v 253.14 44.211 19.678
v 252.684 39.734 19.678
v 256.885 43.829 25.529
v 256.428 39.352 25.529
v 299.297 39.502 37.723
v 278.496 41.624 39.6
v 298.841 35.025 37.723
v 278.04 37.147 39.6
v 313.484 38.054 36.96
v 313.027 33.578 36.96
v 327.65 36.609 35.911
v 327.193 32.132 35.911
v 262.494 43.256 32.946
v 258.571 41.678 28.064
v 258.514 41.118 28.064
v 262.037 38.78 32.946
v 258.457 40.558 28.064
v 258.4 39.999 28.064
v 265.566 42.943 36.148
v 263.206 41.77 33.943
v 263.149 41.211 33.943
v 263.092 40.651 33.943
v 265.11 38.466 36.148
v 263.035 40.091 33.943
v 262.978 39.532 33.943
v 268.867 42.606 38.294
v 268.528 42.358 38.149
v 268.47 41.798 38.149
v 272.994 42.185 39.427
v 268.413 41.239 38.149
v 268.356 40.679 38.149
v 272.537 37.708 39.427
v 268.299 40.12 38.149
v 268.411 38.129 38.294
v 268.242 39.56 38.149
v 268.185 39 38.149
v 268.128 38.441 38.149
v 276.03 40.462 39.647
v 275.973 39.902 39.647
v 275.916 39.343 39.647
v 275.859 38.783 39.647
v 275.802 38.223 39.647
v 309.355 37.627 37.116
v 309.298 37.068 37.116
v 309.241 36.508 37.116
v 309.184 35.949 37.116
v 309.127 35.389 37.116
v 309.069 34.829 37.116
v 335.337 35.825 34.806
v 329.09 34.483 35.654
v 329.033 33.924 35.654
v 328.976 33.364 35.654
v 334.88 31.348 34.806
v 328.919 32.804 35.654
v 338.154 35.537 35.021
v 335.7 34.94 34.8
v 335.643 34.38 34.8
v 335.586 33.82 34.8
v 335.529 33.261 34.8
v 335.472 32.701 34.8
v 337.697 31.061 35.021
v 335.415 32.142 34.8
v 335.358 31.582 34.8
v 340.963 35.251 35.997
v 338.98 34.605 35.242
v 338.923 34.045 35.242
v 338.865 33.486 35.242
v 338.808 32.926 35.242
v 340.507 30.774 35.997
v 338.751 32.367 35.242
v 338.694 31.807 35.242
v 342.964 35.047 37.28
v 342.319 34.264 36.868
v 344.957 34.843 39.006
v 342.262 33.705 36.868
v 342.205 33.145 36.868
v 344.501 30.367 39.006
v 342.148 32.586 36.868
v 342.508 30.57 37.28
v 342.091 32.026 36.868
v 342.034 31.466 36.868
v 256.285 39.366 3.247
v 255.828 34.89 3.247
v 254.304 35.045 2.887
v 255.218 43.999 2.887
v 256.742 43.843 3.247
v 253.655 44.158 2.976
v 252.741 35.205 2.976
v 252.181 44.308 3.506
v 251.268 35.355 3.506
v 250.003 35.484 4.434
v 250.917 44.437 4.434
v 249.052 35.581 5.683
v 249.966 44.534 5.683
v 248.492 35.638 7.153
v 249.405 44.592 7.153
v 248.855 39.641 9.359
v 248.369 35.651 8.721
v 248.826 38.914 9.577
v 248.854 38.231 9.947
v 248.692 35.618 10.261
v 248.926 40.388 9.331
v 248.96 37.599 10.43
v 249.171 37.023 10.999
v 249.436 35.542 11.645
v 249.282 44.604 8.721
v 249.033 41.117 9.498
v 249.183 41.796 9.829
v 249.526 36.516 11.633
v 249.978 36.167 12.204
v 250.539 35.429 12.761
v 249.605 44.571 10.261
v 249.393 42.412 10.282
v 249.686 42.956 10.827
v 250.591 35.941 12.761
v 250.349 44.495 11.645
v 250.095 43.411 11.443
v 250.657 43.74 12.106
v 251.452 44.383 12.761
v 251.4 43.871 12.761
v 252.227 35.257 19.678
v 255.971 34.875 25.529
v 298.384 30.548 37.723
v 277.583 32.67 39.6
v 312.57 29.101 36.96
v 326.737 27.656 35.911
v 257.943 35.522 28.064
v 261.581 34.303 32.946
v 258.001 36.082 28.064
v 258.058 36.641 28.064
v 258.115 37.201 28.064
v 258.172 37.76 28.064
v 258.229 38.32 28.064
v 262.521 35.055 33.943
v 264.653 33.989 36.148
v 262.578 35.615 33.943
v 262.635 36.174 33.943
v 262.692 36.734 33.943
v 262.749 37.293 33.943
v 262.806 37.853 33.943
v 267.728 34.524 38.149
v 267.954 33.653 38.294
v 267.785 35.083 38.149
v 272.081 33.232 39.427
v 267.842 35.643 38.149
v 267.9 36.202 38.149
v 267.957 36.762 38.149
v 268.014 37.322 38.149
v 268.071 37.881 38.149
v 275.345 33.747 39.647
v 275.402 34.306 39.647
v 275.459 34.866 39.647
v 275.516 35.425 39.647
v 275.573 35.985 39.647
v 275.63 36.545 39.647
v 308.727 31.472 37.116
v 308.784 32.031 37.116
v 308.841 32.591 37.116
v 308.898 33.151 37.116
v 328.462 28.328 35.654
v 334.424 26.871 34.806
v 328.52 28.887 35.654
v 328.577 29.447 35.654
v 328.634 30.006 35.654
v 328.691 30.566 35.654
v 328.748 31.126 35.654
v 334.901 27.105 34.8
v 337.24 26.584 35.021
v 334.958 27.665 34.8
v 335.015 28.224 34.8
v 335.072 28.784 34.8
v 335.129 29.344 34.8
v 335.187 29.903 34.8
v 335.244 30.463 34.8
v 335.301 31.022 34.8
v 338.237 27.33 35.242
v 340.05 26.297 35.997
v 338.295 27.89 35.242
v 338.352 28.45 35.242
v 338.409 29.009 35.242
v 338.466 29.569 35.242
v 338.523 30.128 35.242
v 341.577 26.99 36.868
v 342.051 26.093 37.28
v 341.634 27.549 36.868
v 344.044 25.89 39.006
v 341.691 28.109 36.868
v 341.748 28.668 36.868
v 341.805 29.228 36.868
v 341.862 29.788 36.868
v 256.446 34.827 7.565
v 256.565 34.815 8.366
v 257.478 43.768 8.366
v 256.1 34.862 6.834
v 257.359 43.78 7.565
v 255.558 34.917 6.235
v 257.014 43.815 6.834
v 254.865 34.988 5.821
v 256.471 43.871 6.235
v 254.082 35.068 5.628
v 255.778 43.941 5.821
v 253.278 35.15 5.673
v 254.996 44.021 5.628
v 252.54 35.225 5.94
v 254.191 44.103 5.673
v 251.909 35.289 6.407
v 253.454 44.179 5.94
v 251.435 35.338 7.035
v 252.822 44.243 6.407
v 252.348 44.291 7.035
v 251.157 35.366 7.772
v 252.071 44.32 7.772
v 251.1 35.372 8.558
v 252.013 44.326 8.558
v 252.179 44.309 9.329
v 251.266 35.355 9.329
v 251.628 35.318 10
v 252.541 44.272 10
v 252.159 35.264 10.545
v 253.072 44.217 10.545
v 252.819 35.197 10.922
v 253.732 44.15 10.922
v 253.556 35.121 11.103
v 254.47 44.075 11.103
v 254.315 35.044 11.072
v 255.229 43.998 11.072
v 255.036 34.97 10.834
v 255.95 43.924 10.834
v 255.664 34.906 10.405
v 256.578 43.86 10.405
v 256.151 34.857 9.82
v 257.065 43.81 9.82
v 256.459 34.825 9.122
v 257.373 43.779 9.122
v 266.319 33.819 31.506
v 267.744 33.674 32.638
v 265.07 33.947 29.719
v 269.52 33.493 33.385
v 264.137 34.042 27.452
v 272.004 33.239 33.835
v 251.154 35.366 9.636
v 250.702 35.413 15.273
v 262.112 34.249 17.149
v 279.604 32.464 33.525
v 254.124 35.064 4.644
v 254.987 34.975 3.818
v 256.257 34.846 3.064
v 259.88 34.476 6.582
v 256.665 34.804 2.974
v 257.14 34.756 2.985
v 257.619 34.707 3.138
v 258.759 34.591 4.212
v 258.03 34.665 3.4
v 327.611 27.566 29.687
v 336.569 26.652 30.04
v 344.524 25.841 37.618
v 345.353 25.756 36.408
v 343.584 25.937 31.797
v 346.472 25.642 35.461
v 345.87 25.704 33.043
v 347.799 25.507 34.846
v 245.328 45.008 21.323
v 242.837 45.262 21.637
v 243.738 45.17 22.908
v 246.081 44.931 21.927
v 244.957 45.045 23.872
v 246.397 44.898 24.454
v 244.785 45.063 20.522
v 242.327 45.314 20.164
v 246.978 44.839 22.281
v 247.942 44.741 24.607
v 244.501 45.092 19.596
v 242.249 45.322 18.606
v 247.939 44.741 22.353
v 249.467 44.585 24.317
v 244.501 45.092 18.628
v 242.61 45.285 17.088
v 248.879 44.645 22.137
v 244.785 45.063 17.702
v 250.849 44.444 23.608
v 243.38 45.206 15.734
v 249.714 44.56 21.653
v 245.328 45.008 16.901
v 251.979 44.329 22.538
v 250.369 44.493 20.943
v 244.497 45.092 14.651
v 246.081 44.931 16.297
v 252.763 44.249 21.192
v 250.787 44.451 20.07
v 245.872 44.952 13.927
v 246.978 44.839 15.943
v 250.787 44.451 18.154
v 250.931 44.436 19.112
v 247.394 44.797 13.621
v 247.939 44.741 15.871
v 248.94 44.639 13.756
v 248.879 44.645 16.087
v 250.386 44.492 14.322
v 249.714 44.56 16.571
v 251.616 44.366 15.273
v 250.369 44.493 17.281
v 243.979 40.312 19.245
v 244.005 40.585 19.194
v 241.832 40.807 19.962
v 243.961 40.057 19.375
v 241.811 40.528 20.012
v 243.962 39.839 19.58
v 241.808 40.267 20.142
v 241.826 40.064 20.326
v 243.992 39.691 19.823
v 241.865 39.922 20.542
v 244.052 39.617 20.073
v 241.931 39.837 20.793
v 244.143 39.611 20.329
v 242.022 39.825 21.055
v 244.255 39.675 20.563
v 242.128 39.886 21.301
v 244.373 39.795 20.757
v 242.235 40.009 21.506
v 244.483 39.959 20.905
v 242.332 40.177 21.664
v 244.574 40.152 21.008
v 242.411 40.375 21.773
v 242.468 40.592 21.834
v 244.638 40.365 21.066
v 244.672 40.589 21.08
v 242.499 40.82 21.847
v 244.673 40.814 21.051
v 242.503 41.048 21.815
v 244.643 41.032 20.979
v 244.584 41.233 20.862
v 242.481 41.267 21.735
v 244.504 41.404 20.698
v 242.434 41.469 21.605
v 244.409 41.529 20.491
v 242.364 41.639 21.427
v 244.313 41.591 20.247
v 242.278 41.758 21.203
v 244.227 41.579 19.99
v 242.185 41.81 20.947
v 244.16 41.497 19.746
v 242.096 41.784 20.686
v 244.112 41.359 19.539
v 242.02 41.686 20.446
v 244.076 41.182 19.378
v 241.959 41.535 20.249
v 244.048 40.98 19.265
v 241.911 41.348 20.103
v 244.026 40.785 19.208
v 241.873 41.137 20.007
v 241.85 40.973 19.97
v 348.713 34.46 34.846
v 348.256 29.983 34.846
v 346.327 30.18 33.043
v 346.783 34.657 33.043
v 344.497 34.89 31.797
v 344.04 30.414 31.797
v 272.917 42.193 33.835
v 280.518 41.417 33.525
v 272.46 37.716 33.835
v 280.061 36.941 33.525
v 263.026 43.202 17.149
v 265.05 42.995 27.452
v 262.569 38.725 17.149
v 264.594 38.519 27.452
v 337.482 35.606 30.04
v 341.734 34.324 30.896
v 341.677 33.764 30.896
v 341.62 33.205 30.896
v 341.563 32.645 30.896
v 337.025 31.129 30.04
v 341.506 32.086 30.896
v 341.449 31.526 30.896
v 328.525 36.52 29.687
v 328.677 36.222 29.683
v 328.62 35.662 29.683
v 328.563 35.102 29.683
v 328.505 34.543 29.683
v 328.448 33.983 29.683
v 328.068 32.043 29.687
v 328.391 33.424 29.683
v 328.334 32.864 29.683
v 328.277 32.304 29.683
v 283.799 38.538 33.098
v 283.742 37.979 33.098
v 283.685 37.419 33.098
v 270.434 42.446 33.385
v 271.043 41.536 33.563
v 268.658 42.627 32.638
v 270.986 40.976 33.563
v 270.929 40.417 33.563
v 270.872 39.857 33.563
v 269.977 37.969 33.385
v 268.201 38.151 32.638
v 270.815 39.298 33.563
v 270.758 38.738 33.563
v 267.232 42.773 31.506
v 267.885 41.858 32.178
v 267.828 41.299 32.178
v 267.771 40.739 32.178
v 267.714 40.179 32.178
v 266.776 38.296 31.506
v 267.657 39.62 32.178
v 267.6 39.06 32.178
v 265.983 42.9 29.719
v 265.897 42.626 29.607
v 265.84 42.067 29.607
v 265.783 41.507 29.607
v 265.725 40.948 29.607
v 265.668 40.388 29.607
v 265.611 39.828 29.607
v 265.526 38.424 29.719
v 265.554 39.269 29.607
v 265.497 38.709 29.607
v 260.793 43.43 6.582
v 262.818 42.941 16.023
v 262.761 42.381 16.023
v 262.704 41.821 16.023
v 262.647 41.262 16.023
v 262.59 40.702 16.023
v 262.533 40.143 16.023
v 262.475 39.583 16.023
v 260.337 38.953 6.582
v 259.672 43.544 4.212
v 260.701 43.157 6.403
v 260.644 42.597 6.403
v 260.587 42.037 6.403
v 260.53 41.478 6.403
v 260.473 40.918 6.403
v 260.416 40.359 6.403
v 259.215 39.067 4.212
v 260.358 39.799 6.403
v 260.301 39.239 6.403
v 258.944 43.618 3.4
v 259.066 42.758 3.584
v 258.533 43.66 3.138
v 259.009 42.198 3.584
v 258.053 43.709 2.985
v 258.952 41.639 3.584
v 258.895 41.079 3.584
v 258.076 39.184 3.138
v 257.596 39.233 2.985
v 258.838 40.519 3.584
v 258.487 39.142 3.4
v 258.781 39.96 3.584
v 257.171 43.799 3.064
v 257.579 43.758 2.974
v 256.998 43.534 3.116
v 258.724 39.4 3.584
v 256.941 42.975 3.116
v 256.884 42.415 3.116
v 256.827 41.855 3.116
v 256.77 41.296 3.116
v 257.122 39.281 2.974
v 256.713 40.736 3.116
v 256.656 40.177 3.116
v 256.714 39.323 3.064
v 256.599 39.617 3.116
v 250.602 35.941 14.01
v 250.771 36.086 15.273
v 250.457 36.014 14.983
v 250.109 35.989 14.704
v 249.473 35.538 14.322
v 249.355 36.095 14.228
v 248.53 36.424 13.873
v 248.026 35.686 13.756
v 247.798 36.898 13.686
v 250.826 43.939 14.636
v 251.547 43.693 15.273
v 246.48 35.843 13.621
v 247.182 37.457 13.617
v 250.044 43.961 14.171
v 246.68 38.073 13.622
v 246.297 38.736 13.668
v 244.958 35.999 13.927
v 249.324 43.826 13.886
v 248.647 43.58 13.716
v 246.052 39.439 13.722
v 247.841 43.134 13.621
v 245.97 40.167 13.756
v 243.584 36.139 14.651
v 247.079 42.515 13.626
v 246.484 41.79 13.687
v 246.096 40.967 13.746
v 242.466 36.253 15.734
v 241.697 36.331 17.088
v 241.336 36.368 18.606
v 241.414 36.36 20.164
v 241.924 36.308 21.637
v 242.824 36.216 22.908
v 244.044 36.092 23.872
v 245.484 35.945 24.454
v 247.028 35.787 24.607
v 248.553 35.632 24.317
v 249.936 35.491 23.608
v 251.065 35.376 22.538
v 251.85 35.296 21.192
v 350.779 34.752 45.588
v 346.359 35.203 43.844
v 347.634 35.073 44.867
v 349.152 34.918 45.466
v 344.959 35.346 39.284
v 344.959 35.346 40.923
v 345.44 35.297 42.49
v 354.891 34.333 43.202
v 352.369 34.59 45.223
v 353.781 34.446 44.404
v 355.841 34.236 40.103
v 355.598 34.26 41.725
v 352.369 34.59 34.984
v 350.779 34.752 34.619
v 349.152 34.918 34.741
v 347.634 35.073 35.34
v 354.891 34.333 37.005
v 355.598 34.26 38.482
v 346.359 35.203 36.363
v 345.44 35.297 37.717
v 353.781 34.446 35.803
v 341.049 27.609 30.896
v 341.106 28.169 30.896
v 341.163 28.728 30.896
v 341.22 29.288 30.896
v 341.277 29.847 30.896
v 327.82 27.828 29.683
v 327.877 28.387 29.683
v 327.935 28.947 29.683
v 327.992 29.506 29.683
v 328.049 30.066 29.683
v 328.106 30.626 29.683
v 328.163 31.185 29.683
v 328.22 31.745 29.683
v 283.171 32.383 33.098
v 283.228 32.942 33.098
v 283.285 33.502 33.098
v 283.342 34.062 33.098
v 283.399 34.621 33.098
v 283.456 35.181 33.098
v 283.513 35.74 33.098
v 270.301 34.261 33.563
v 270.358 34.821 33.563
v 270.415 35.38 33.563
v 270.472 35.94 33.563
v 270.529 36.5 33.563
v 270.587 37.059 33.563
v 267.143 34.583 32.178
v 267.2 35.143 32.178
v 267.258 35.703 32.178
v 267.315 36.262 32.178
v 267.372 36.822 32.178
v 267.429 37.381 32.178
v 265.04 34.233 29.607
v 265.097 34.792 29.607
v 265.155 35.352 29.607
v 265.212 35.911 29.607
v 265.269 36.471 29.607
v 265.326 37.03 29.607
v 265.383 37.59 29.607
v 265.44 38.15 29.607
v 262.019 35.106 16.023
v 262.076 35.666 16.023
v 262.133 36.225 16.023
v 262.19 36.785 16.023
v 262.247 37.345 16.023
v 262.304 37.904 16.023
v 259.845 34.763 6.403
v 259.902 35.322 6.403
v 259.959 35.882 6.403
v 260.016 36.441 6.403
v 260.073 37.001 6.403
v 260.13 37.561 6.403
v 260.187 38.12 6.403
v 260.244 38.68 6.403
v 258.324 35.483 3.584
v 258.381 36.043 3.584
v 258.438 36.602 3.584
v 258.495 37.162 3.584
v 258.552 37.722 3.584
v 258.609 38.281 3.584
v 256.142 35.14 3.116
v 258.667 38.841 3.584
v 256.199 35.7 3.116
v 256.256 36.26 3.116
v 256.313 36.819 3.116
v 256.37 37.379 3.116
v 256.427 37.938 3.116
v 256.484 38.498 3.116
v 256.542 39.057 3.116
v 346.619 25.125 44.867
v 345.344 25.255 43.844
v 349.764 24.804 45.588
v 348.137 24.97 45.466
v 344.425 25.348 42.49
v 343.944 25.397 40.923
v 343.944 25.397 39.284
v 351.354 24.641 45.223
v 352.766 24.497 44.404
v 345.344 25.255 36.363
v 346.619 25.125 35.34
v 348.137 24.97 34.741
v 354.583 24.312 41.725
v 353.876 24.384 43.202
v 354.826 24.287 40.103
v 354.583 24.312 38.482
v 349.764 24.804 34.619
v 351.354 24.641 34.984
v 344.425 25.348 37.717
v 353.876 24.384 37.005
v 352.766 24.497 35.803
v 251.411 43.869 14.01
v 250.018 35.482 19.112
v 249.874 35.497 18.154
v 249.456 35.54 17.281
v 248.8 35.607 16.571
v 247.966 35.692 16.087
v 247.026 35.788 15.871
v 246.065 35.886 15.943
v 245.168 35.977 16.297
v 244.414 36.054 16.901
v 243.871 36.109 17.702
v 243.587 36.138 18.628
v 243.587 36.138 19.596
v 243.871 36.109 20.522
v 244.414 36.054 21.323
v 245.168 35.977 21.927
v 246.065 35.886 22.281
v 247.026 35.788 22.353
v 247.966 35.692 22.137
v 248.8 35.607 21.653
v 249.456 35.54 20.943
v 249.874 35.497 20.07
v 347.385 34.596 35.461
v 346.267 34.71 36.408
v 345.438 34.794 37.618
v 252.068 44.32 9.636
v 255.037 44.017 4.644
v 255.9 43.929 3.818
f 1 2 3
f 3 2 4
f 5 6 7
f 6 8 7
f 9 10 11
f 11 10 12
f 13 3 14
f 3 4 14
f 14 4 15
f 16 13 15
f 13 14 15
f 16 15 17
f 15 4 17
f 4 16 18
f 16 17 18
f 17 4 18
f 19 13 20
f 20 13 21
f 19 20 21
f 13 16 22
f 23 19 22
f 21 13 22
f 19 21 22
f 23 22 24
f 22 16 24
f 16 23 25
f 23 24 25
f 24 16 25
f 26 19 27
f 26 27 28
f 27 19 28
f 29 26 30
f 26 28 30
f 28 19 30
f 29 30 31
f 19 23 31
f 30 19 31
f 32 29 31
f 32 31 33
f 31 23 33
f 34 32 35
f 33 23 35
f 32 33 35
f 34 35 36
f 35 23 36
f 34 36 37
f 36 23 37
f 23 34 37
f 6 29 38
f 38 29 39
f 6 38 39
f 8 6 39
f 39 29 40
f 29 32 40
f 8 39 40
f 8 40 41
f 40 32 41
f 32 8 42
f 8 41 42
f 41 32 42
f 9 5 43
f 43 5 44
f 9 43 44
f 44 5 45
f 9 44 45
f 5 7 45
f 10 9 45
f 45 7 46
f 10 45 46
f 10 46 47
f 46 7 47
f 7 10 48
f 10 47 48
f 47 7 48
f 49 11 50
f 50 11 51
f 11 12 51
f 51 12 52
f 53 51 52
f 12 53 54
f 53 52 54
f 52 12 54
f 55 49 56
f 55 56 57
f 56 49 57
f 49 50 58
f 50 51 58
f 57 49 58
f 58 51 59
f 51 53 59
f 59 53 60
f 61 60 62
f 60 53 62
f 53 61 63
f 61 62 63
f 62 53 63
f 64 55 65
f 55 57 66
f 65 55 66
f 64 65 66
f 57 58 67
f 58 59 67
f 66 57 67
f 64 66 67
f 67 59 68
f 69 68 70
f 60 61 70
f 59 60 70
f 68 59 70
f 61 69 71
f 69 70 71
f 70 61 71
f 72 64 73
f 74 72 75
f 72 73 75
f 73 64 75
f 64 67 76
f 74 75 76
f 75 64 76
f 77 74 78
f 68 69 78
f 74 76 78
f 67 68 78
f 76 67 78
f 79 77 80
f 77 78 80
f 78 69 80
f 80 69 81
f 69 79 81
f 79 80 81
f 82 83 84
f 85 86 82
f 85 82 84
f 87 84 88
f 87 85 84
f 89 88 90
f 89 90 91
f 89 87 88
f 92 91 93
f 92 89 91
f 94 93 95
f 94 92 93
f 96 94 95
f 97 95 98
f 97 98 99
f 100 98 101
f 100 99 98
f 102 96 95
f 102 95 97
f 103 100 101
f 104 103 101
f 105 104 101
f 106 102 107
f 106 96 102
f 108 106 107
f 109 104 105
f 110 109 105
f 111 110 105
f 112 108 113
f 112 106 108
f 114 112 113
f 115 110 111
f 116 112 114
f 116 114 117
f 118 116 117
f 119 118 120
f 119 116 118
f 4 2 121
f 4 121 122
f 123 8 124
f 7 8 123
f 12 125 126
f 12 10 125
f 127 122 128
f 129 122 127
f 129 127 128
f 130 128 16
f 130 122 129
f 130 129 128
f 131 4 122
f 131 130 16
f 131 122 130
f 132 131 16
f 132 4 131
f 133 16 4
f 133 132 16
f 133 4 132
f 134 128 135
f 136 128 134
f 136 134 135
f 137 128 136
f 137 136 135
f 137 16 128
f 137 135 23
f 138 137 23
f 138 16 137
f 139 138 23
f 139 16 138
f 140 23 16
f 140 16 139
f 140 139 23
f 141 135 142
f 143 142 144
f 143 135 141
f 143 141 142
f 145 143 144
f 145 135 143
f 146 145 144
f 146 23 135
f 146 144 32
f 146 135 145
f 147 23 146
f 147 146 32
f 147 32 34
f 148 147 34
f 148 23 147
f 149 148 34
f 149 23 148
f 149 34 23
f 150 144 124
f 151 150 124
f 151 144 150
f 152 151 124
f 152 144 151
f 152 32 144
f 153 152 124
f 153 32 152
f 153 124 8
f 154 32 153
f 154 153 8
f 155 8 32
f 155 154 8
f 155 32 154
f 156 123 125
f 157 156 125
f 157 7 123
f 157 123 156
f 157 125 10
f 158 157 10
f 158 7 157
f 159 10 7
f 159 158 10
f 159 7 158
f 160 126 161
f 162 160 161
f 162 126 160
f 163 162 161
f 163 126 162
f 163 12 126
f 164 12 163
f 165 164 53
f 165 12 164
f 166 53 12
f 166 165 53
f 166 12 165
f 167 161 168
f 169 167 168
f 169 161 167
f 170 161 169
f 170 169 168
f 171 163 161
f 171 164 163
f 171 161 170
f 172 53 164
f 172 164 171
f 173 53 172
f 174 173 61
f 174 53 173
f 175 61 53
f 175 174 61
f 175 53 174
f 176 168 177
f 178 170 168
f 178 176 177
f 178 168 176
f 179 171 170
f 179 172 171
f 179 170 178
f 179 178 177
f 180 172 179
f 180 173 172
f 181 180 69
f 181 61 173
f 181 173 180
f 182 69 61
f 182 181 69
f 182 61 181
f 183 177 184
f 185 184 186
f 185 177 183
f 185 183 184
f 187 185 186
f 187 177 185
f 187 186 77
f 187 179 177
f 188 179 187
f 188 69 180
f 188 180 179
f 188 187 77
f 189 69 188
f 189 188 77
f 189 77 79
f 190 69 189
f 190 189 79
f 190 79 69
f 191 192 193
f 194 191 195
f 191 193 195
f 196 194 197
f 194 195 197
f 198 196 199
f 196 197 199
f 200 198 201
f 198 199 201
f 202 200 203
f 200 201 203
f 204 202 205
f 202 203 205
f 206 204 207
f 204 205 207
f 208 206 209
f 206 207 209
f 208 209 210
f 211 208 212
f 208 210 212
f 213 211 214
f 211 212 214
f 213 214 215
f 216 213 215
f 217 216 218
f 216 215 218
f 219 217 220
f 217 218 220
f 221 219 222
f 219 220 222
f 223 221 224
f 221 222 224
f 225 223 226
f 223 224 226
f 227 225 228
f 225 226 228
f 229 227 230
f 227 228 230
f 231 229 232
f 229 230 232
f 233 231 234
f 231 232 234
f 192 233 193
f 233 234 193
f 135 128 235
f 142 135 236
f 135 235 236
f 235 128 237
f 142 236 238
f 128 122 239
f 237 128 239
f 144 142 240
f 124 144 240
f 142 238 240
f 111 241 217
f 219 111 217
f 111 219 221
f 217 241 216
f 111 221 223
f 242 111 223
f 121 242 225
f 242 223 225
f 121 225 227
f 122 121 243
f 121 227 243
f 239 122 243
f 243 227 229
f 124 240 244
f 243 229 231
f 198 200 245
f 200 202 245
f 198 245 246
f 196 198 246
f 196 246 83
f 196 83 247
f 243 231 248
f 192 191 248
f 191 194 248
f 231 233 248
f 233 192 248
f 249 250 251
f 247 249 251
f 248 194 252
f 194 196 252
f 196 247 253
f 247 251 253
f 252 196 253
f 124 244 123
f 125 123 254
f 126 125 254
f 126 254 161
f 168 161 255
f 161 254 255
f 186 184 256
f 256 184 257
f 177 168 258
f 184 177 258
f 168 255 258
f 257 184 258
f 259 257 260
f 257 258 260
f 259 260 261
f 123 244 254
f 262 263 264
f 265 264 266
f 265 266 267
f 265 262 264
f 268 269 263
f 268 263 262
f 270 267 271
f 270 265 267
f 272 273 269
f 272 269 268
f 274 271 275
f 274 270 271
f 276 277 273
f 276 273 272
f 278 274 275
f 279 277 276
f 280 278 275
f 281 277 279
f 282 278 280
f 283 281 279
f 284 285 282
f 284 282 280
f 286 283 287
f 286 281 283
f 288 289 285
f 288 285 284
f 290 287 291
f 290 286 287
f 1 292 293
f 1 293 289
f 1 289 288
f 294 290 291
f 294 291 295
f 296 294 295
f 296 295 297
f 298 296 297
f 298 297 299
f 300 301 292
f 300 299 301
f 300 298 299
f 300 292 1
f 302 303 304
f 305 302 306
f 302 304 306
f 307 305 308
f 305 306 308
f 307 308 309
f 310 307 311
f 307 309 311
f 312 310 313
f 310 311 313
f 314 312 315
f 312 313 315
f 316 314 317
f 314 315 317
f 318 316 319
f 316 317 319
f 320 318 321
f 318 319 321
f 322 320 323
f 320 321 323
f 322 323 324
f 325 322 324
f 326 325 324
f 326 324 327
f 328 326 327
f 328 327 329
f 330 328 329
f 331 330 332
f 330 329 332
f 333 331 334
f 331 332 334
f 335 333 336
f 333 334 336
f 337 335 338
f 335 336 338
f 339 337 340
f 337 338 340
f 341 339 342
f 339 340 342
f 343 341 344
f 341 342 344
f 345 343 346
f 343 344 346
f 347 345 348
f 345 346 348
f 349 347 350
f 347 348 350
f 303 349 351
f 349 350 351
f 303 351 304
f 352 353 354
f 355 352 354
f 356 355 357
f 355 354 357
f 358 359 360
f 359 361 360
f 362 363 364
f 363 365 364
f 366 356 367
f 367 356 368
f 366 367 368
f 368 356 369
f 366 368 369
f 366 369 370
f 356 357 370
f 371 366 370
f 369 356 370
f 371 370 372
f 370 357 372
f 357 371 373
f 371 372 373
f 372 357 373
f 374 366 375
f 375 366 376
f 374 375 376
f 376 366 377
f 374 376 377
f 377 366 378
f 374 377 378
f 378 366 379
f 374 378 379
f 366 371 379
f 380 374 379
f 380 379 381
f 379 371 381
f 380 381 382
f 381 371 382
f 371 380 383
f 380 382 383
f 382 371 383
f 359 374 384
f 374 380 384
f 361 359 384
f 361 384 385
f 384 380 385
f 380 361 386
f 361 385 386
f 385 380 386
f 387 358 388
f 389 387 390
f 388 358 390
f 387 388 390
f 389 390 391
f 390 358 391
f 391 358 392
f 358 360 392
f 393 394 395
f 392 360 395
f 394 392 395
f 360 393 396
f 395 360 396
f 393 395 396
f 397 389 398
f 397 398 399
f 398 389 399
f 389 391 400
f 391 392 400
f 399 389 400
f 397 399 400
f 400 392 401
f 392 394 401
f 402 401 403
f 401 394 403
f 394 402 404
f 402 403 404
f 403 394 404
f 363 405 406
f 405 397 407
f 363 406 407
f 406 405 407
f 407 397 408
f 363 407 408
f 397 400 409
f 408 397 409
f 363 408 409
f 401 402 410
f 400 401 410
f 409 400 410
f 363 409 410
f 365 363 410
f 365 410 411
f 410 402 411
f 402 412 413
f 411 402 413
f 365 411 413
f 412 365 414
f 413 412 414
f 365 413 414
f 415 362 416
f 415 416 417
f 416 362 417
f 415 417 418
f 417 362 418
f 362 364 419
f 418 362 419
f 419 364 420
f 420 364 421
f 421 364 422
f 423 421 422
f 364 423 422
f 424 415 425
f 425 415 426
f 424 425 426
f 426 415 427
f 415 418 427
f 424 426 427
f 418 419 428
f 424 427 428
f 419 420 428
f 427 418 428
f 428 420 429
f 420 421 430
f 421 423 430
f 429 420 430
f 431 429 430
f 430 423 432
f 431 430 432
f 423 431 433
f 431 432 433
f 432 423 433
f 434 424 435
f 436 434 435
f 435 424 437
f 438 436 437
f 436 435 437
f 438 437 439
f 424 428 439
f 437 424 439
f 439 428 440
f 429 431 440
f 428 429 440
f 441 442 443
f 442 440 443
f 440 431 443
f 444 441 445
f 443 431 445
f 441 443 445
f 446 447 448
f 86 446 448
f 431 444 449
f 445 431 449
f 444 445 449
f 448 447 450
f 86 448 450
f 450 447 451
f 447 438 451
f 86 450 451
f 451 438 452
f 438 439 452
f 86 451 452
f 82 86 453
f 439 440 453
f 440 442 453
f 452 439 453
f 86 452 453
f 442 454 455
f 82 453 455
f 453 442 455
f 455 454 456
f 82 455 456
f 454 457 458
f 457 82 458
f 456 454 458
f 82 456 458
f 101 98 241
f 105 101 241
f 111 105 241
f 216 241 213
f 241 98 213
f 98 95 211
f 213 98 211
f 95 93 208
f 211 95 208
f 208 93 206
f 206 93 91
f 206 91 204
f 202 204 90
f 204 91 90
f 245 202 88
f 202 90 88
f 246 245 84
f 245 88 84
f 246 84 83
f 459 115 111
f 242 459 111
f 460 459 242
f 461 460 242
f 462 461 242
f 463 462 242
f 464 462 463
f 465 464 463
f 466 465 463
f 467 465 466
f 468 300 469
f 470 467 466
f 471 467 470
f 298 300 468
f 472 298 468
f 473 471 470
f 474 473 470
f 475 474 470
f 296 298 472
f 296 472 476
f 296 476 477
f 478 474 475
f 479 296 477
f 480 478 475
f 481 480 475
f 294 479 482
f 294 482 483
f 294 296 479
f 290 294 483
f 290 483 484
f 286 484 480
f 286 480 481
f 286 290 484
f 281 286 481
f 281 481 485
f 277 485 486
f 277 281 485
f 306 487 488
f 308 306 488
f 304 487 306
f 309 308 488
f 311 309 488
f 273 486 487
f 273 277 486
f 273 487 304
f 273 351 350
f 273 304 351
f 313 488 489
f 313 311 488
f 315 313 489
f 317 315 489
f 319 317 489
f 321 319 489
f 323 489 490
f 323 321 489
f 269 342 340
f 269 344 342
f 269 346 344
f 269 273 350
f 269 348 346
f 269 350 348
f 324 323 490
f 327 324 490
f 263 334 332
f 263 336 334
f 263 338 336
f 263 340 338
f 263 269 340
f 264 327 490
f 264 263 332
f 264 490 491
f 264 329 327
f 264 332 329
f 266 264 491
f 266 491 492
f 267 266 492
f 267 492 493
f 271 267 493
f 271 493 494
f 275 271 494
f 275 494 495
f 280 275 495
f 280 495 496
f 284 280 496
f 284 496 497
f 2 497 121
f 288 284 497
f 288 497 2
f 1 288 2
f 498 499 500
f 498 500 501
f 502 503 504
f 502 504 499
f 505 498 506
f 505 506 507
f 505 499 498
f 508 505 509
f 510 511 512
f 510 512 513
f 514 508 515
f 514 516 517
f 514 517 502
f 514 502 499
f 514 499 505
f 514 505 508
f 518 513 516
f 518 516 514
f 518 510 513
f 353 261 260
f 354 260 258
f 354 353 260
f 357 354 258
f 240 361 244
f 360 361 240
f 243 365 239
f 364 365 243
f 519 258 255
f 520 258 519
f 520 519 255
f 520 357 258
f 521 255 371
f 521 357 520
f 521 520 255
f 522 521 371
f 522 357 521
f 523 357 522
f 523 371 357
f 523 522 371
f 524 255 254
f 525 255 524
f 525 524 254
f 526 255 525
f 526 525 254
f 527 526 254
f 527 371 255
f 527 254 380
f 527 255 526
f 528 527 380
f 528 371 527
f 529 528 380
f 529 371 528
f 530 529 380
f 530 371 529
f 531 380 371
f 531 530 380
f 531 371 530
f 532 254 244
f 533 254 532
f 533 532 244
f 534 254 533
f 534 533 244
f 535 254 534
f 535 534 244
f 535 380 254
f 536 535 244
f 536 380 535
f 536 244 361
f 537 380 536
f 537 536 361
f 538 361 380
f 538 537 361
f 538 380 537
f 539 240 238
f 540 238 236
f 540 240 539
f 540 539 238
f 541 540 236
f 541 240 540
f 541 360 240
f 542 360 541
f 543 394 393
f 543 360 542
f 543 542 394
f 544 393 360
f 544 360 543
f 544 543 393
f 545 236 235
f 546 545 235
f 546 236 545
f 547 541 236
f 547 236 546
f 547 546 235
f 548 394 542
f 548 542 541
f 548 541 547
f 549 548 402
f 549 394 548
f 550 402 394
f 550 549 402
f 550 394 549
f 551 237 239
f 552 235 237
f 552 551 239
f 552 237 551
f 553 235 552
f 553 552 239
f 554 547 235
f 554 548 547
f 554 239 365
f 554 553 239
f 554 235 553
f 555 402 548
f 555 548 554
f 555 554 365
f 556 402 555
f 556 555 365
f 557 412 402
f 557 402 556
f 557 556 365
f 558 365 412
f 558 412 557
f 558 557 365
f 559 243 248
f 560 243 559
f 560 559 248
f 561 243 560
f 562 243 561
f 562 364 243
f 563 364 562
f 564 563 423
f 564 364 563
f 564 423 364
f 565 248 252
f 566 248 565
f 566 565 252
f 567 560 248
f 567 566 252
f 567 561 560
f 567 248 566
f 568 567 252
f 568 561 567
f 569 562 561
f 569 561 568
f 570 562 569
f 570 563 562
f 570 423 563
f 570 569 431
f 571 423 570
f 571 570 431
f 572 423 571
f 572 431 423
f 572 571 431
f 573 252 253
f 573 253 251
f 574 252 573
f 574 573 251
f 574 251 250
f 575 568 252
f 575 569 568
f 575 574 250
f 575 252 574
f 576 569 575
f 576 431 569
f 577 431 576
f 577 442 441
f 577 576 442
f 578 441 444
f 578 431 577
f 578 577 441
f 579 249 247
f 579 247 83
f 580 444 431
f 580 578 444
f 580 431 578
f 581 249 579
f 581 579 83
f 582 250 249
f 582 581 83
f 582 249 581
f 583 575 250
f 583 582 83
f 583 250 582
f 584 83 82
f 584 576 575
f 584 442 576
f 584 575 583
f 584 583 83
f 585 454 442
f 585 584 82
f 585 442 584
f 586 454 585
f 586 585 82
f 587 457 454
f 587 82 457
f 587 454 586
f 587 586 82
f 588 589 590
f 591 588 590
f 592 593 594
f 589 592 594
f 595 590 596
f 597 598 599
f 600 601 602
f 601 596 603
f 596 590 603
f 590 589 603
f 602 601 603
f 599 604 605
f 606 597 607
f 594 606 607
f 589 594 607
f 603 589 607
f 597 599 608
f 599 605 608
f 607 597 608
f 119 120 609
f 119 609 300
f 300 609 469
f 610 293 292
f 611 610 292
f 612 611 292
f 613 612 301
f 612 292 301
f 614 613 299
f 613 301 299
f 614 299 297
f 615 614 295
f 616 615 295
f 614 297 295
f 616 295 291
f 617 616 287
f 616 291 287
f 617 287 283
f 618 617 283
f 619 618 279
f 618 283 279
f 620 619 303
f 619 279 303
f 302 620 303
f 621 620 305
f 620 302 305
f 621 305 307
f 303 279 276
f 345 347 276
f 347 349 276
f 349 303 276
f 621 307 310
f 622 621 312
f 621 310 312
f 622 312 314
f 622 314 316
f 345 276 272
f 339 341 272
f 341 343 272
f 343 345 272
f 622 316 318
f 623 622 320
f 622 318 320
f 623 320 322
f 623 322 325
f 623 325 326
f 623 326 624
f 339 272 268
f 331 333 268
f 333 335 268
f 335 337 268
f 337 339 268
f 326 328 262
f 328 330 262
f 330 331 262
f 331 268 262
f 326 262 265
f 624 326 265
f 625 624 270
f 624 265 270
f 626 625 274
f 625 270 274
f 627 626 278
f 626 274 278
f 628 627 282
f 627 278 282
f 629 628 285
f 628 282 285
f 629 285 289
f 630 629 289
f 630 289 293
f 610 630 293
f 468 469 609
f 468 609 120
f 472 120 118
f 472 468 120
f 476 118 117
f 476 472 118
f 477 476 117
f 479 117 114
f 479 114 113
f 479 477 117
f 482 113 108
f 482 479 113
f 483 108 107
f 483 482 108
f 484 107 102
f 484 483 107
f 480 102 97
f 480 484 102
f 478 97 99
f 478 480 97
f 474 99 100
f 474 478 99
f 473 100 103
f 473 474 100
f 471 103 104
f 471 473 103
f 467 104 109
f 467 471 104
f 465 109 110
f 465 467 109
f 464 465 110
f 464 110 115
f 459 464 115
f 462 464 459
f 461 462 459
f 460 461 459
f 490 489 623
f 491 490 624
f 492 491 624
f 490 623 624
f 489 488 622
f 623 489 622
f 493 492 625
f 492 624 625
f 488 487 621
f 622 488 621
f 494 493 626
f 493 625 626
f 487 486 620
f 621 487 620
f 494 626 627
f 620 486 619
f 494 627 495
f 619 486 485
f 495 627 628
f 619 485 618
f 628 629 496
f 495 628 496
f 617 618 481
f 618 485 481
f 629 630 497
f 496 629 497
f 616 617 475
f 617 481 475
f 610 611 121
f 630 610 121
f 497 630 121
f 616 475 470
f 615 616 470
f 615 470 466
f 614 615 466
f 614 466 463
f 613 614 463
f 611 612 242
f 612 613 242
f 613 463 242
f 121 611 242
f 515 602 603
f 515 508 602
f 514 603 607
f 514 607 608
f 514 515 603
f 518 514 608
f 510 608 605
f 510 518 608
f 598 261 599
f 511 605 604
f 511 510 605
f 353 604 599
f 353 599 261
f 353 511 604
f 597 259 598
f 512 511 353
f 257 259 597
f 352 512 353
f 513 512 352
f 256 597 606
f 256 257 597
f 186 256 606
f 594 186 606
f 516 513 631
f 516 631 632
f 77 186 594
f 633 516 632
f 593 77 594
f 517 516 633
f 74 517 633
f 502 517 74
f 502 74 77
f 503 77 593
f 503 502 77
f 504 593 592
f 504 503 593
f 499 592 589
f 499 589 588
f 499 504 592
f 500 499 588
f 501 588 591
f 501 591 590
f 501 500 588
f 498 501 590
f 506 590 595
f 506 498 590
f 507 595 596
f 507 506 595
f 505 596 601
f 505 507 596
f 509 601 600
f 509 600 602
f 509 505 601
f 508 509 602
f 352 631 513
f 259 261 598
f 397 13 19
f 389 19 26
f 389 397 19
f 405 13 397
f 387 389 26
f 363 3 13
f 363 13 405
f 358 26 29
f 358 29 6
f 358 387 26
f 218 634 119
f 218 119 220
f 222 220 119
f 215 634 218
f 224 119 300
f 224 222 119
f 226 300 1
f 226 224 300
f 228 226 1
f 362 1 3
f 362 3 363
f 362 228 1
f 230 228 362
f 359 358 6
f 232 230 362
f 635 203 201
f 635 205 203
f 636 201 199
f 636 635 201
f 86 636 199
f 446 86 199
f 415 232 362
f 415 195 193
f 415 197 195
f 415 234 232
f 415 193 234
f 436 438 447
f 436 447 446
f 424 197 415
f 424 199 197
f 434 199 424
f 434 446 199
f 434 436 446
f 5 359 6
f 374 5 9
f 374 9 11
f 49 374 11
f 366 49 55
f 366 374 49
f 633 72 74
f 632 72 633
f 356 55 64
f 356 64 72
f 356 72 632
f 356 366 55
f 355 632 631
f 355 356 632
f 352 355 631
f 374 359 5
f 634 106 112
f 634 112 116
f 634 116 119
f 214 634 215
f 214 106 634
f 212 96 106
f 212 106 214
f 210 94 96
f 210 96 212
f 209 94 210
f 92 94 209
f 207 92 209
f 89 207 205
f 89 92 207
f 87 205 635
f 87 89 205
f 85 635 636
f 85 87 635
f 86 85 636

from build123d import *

# Parameters (mm, degrees)
PALANCA_DEPTH                 = 4.5
BUJE_PIVOTE_PROFILE_R         = 5.5
BOLA_PROFILE_R                = 5.5
BRAZO_CABEZAL_PROFILE_R       = 4
OREJA_CABEZAL_PROFILE_R       = 5.5
AGUJERO_PIVOTE_PROFILE_R      = 2.75
ALOJAMIENTO_CABEZAL_PROFILE_R = 3.25
SALIDA_CABLE_PROFILE_R        = 1


with BuildPart() as part:
    # Sk_Palanca → Palanca (new, symmetric)
    with BuildSketch(Plane(origin=(6.614764097, 64.837786693, 0), x_dir=(-0.994836213398138, 0.10149339146789091, 0), z_dir=(-0.1014933914678909, -0.9948362133981379, 0))):
        with BuildLine():
            add(Edge.make_bspline(
                [(-246.267712097, -9.635902877), (-243.886968536, -16.428336605), (-252.167229885, -26.539110512), (-262.150904369, -40.917249125), (-282.597733448, -38.61306643), (-302.067834573, -36.912429156), (-321.774042894, -36.730768216), (-335.8922068, -32.77279684), (-346.42741419, -47.422354469), (-345.126178944, -34.200079595), (-335.600297869, -29.860646291), (-321.07478475, -29.32902891), (-301.354059006, -31.612602642), (-282.725652771, -32.142864553), (-261.071507606, -35.64669483), (-257.235825231, -19.931179522), (-254.911764508, 3.376830431), (-247.263524779, -6.794777206), (-246.267712097, -9.635902877)],
                knots=[0, 0, 0, 0, 0.078945947, 0.135623154, 0.200778729, 0.301383988, 0.381877245, 0.435139904, 0.476711636, 0.50085207, 0.542423802, 0.595686461, 0.676179719, 0.776784977, 0.841940552, 0.8880327, 0.966978646, 1, 1, 1, 1], degree=3))
        make_face()
    extrude(amount=PALANCA_DEPTH, both=True)

    # Buje_pivote: sweep along a curve in space
    with BuildLine() as buje_pivote_path:
        Line((253.82871512, 35.093611814, 8.366303886), (254.742155643, 44.047137735, 8.366303886))
    # Buje_pivote profile (on start of the path) → Buje_pivote (sweep)
    with BuildSketch(Plane(origin=(253.82871512, 35.093611814, 8.366303886), x_dir=(0.9948362133981379, -0.10149339146789141, 0), z_dir=(0.10149339146789141, 0.9948362133981379, 0))):
        Circle(BUJE_PIVOTE_PROFILE_R)
    sweep(path=buje_pivote_path.line)

    # Bola: sweep along a curve in space
    with BuildLine() as bola_path:
        Line((349.354760335, 24.845430088, 40.103497474), (350.369694249, 34.793792222, 40.103497474))
    # Bola profile (on start of the path) → Bola (sweep)
    with BuildSketch(Plane(origin=(349.354760335, 24.845430088, 40.103497474), x_dir=(0.9948362133981379, -0.101493391467892, 0), z_dir=(0.101493391467892, 0.9948362133981379, 0))):
        Circle(BOLA_PROFILE_R)
    sweep(path=bola_path.line)

    # Brazo_cabezal: sweep along a curve in space
    with BuildLine() as brazo_cabezal_path:
        Line((254.285435381, 39.570374774, 8.366303886), (247.241040254, 40.289045388, 19.112001157))
    # Brazo_cabezal profile (on start of the path) → Brazo_cabezal (sweep)
    with BuildSketch(Plane(origin=(254.285435381, 39.570374774, 8.366303886), x_dir=(0.8363144439647209, 0, 0.5482500805435233), z_dir=(-0.5473944999393169, 0.05584529746855661, 0.835009319820344))):
        Circle(BRAZO_CABEZAL_PROFILE_R)
    sweep(path=brazo_cabezal_path.line)

    # Oreja_cabezal: sweep along a curve in space
    with BuildLine() as oreja_cabezal_path:
        Line((246.784319992, 35.812282428, 19.112001157), (247.697760515, 44.765808349, 19.112001157))
    # Oreja_cabezal profile (on start of the path) → Oreja_cabezal (sweep)
    with BuildSketch(Plane(origin=(246.784319992, 35.812282428, 19.112001157), x_dir=(0.9948362133981379, -0.10149339146789141, 0), z_dir=(0.10149339146789141, 0.9948362133981379, 0))):
        Circle(OREJA_CABEZAL_PROFILE_R)
    sweep(path=oreja_cabezal_path.line)

    # Agujero_pivote: sweep along a curve in space
    with BuildLine() as agujero_pivote_path:
        Line((253.473488249, 31.611685067, 8.366303886), (255.097382513, 47.529064481, 8.366303886))
    # Agujero_pivote profile (on start of the path) → Agujero_pivote (sweep, cut)
    with BuildSketch(Plane(origin=(253.473488249, 31.611685067, 8.366303886), x_dir=(0.9948362133981381, -0.10149339146789058, 0), z_dir=(0.10149339146789058, 0.9948362133981381, 0))):
        Circle(AGUJERO_PIVOTE_PROFILE_R)
    sweep(path=agujero_pivote_path.line, mode=Mode.SUBTRACT)

    # Alojamiento_cabezal: sweep along a curve in space
    with BuildLine() as alojamiento_cabezal_path:
        Line((246.632079905, 34.320028108, 19.112001157), (247.850000602, 46.258062669, 19.112001157))
    # Alojamiento_cabezal profile (on start of the path) → Alojamiento_cabezal (sweep, cut)
    with BuildSketch(Plane(origin=(246.632079905, 34.320028108, 19.112001157), x_dir=(0.9948362133981378, -0.10149339146789292, 0), z_dir=(0.10149339146789292, 0.9948362133981378, 0))):
        Circle(ALOJAMIENTO_CABEZAL_PROFILE_R)
    sweep(path=alojamiento_cabezal_path.line, mode=Mode.SUBTRACT)

    # Salida_cable: sweep along a curve in space
    with BuildLine() as salida_cable_path:
        Line((247.241040254, 40.289045388, 19.112001157), (238.545113875, 41.176205554, 22.183452158))
    # Salida_cable profile (on start of the path) → Salida_cable (sweep, cut)
    with BuildSketch(Plane(origin=(247.241040254, 40.289045388, 19.112001157), x_dir=(-0.3330419255629734, 0, -0.9429120191286708), z_dir=(-0.9385793605381186, 0.09575405597409072, 0.33151160573404825))):
        Circle(SALIDA_CABLE_PROFILE_R)
    sweep(path=salida_cable_path.line, mode=Mode.SUBTRACT)


solid = part.part
